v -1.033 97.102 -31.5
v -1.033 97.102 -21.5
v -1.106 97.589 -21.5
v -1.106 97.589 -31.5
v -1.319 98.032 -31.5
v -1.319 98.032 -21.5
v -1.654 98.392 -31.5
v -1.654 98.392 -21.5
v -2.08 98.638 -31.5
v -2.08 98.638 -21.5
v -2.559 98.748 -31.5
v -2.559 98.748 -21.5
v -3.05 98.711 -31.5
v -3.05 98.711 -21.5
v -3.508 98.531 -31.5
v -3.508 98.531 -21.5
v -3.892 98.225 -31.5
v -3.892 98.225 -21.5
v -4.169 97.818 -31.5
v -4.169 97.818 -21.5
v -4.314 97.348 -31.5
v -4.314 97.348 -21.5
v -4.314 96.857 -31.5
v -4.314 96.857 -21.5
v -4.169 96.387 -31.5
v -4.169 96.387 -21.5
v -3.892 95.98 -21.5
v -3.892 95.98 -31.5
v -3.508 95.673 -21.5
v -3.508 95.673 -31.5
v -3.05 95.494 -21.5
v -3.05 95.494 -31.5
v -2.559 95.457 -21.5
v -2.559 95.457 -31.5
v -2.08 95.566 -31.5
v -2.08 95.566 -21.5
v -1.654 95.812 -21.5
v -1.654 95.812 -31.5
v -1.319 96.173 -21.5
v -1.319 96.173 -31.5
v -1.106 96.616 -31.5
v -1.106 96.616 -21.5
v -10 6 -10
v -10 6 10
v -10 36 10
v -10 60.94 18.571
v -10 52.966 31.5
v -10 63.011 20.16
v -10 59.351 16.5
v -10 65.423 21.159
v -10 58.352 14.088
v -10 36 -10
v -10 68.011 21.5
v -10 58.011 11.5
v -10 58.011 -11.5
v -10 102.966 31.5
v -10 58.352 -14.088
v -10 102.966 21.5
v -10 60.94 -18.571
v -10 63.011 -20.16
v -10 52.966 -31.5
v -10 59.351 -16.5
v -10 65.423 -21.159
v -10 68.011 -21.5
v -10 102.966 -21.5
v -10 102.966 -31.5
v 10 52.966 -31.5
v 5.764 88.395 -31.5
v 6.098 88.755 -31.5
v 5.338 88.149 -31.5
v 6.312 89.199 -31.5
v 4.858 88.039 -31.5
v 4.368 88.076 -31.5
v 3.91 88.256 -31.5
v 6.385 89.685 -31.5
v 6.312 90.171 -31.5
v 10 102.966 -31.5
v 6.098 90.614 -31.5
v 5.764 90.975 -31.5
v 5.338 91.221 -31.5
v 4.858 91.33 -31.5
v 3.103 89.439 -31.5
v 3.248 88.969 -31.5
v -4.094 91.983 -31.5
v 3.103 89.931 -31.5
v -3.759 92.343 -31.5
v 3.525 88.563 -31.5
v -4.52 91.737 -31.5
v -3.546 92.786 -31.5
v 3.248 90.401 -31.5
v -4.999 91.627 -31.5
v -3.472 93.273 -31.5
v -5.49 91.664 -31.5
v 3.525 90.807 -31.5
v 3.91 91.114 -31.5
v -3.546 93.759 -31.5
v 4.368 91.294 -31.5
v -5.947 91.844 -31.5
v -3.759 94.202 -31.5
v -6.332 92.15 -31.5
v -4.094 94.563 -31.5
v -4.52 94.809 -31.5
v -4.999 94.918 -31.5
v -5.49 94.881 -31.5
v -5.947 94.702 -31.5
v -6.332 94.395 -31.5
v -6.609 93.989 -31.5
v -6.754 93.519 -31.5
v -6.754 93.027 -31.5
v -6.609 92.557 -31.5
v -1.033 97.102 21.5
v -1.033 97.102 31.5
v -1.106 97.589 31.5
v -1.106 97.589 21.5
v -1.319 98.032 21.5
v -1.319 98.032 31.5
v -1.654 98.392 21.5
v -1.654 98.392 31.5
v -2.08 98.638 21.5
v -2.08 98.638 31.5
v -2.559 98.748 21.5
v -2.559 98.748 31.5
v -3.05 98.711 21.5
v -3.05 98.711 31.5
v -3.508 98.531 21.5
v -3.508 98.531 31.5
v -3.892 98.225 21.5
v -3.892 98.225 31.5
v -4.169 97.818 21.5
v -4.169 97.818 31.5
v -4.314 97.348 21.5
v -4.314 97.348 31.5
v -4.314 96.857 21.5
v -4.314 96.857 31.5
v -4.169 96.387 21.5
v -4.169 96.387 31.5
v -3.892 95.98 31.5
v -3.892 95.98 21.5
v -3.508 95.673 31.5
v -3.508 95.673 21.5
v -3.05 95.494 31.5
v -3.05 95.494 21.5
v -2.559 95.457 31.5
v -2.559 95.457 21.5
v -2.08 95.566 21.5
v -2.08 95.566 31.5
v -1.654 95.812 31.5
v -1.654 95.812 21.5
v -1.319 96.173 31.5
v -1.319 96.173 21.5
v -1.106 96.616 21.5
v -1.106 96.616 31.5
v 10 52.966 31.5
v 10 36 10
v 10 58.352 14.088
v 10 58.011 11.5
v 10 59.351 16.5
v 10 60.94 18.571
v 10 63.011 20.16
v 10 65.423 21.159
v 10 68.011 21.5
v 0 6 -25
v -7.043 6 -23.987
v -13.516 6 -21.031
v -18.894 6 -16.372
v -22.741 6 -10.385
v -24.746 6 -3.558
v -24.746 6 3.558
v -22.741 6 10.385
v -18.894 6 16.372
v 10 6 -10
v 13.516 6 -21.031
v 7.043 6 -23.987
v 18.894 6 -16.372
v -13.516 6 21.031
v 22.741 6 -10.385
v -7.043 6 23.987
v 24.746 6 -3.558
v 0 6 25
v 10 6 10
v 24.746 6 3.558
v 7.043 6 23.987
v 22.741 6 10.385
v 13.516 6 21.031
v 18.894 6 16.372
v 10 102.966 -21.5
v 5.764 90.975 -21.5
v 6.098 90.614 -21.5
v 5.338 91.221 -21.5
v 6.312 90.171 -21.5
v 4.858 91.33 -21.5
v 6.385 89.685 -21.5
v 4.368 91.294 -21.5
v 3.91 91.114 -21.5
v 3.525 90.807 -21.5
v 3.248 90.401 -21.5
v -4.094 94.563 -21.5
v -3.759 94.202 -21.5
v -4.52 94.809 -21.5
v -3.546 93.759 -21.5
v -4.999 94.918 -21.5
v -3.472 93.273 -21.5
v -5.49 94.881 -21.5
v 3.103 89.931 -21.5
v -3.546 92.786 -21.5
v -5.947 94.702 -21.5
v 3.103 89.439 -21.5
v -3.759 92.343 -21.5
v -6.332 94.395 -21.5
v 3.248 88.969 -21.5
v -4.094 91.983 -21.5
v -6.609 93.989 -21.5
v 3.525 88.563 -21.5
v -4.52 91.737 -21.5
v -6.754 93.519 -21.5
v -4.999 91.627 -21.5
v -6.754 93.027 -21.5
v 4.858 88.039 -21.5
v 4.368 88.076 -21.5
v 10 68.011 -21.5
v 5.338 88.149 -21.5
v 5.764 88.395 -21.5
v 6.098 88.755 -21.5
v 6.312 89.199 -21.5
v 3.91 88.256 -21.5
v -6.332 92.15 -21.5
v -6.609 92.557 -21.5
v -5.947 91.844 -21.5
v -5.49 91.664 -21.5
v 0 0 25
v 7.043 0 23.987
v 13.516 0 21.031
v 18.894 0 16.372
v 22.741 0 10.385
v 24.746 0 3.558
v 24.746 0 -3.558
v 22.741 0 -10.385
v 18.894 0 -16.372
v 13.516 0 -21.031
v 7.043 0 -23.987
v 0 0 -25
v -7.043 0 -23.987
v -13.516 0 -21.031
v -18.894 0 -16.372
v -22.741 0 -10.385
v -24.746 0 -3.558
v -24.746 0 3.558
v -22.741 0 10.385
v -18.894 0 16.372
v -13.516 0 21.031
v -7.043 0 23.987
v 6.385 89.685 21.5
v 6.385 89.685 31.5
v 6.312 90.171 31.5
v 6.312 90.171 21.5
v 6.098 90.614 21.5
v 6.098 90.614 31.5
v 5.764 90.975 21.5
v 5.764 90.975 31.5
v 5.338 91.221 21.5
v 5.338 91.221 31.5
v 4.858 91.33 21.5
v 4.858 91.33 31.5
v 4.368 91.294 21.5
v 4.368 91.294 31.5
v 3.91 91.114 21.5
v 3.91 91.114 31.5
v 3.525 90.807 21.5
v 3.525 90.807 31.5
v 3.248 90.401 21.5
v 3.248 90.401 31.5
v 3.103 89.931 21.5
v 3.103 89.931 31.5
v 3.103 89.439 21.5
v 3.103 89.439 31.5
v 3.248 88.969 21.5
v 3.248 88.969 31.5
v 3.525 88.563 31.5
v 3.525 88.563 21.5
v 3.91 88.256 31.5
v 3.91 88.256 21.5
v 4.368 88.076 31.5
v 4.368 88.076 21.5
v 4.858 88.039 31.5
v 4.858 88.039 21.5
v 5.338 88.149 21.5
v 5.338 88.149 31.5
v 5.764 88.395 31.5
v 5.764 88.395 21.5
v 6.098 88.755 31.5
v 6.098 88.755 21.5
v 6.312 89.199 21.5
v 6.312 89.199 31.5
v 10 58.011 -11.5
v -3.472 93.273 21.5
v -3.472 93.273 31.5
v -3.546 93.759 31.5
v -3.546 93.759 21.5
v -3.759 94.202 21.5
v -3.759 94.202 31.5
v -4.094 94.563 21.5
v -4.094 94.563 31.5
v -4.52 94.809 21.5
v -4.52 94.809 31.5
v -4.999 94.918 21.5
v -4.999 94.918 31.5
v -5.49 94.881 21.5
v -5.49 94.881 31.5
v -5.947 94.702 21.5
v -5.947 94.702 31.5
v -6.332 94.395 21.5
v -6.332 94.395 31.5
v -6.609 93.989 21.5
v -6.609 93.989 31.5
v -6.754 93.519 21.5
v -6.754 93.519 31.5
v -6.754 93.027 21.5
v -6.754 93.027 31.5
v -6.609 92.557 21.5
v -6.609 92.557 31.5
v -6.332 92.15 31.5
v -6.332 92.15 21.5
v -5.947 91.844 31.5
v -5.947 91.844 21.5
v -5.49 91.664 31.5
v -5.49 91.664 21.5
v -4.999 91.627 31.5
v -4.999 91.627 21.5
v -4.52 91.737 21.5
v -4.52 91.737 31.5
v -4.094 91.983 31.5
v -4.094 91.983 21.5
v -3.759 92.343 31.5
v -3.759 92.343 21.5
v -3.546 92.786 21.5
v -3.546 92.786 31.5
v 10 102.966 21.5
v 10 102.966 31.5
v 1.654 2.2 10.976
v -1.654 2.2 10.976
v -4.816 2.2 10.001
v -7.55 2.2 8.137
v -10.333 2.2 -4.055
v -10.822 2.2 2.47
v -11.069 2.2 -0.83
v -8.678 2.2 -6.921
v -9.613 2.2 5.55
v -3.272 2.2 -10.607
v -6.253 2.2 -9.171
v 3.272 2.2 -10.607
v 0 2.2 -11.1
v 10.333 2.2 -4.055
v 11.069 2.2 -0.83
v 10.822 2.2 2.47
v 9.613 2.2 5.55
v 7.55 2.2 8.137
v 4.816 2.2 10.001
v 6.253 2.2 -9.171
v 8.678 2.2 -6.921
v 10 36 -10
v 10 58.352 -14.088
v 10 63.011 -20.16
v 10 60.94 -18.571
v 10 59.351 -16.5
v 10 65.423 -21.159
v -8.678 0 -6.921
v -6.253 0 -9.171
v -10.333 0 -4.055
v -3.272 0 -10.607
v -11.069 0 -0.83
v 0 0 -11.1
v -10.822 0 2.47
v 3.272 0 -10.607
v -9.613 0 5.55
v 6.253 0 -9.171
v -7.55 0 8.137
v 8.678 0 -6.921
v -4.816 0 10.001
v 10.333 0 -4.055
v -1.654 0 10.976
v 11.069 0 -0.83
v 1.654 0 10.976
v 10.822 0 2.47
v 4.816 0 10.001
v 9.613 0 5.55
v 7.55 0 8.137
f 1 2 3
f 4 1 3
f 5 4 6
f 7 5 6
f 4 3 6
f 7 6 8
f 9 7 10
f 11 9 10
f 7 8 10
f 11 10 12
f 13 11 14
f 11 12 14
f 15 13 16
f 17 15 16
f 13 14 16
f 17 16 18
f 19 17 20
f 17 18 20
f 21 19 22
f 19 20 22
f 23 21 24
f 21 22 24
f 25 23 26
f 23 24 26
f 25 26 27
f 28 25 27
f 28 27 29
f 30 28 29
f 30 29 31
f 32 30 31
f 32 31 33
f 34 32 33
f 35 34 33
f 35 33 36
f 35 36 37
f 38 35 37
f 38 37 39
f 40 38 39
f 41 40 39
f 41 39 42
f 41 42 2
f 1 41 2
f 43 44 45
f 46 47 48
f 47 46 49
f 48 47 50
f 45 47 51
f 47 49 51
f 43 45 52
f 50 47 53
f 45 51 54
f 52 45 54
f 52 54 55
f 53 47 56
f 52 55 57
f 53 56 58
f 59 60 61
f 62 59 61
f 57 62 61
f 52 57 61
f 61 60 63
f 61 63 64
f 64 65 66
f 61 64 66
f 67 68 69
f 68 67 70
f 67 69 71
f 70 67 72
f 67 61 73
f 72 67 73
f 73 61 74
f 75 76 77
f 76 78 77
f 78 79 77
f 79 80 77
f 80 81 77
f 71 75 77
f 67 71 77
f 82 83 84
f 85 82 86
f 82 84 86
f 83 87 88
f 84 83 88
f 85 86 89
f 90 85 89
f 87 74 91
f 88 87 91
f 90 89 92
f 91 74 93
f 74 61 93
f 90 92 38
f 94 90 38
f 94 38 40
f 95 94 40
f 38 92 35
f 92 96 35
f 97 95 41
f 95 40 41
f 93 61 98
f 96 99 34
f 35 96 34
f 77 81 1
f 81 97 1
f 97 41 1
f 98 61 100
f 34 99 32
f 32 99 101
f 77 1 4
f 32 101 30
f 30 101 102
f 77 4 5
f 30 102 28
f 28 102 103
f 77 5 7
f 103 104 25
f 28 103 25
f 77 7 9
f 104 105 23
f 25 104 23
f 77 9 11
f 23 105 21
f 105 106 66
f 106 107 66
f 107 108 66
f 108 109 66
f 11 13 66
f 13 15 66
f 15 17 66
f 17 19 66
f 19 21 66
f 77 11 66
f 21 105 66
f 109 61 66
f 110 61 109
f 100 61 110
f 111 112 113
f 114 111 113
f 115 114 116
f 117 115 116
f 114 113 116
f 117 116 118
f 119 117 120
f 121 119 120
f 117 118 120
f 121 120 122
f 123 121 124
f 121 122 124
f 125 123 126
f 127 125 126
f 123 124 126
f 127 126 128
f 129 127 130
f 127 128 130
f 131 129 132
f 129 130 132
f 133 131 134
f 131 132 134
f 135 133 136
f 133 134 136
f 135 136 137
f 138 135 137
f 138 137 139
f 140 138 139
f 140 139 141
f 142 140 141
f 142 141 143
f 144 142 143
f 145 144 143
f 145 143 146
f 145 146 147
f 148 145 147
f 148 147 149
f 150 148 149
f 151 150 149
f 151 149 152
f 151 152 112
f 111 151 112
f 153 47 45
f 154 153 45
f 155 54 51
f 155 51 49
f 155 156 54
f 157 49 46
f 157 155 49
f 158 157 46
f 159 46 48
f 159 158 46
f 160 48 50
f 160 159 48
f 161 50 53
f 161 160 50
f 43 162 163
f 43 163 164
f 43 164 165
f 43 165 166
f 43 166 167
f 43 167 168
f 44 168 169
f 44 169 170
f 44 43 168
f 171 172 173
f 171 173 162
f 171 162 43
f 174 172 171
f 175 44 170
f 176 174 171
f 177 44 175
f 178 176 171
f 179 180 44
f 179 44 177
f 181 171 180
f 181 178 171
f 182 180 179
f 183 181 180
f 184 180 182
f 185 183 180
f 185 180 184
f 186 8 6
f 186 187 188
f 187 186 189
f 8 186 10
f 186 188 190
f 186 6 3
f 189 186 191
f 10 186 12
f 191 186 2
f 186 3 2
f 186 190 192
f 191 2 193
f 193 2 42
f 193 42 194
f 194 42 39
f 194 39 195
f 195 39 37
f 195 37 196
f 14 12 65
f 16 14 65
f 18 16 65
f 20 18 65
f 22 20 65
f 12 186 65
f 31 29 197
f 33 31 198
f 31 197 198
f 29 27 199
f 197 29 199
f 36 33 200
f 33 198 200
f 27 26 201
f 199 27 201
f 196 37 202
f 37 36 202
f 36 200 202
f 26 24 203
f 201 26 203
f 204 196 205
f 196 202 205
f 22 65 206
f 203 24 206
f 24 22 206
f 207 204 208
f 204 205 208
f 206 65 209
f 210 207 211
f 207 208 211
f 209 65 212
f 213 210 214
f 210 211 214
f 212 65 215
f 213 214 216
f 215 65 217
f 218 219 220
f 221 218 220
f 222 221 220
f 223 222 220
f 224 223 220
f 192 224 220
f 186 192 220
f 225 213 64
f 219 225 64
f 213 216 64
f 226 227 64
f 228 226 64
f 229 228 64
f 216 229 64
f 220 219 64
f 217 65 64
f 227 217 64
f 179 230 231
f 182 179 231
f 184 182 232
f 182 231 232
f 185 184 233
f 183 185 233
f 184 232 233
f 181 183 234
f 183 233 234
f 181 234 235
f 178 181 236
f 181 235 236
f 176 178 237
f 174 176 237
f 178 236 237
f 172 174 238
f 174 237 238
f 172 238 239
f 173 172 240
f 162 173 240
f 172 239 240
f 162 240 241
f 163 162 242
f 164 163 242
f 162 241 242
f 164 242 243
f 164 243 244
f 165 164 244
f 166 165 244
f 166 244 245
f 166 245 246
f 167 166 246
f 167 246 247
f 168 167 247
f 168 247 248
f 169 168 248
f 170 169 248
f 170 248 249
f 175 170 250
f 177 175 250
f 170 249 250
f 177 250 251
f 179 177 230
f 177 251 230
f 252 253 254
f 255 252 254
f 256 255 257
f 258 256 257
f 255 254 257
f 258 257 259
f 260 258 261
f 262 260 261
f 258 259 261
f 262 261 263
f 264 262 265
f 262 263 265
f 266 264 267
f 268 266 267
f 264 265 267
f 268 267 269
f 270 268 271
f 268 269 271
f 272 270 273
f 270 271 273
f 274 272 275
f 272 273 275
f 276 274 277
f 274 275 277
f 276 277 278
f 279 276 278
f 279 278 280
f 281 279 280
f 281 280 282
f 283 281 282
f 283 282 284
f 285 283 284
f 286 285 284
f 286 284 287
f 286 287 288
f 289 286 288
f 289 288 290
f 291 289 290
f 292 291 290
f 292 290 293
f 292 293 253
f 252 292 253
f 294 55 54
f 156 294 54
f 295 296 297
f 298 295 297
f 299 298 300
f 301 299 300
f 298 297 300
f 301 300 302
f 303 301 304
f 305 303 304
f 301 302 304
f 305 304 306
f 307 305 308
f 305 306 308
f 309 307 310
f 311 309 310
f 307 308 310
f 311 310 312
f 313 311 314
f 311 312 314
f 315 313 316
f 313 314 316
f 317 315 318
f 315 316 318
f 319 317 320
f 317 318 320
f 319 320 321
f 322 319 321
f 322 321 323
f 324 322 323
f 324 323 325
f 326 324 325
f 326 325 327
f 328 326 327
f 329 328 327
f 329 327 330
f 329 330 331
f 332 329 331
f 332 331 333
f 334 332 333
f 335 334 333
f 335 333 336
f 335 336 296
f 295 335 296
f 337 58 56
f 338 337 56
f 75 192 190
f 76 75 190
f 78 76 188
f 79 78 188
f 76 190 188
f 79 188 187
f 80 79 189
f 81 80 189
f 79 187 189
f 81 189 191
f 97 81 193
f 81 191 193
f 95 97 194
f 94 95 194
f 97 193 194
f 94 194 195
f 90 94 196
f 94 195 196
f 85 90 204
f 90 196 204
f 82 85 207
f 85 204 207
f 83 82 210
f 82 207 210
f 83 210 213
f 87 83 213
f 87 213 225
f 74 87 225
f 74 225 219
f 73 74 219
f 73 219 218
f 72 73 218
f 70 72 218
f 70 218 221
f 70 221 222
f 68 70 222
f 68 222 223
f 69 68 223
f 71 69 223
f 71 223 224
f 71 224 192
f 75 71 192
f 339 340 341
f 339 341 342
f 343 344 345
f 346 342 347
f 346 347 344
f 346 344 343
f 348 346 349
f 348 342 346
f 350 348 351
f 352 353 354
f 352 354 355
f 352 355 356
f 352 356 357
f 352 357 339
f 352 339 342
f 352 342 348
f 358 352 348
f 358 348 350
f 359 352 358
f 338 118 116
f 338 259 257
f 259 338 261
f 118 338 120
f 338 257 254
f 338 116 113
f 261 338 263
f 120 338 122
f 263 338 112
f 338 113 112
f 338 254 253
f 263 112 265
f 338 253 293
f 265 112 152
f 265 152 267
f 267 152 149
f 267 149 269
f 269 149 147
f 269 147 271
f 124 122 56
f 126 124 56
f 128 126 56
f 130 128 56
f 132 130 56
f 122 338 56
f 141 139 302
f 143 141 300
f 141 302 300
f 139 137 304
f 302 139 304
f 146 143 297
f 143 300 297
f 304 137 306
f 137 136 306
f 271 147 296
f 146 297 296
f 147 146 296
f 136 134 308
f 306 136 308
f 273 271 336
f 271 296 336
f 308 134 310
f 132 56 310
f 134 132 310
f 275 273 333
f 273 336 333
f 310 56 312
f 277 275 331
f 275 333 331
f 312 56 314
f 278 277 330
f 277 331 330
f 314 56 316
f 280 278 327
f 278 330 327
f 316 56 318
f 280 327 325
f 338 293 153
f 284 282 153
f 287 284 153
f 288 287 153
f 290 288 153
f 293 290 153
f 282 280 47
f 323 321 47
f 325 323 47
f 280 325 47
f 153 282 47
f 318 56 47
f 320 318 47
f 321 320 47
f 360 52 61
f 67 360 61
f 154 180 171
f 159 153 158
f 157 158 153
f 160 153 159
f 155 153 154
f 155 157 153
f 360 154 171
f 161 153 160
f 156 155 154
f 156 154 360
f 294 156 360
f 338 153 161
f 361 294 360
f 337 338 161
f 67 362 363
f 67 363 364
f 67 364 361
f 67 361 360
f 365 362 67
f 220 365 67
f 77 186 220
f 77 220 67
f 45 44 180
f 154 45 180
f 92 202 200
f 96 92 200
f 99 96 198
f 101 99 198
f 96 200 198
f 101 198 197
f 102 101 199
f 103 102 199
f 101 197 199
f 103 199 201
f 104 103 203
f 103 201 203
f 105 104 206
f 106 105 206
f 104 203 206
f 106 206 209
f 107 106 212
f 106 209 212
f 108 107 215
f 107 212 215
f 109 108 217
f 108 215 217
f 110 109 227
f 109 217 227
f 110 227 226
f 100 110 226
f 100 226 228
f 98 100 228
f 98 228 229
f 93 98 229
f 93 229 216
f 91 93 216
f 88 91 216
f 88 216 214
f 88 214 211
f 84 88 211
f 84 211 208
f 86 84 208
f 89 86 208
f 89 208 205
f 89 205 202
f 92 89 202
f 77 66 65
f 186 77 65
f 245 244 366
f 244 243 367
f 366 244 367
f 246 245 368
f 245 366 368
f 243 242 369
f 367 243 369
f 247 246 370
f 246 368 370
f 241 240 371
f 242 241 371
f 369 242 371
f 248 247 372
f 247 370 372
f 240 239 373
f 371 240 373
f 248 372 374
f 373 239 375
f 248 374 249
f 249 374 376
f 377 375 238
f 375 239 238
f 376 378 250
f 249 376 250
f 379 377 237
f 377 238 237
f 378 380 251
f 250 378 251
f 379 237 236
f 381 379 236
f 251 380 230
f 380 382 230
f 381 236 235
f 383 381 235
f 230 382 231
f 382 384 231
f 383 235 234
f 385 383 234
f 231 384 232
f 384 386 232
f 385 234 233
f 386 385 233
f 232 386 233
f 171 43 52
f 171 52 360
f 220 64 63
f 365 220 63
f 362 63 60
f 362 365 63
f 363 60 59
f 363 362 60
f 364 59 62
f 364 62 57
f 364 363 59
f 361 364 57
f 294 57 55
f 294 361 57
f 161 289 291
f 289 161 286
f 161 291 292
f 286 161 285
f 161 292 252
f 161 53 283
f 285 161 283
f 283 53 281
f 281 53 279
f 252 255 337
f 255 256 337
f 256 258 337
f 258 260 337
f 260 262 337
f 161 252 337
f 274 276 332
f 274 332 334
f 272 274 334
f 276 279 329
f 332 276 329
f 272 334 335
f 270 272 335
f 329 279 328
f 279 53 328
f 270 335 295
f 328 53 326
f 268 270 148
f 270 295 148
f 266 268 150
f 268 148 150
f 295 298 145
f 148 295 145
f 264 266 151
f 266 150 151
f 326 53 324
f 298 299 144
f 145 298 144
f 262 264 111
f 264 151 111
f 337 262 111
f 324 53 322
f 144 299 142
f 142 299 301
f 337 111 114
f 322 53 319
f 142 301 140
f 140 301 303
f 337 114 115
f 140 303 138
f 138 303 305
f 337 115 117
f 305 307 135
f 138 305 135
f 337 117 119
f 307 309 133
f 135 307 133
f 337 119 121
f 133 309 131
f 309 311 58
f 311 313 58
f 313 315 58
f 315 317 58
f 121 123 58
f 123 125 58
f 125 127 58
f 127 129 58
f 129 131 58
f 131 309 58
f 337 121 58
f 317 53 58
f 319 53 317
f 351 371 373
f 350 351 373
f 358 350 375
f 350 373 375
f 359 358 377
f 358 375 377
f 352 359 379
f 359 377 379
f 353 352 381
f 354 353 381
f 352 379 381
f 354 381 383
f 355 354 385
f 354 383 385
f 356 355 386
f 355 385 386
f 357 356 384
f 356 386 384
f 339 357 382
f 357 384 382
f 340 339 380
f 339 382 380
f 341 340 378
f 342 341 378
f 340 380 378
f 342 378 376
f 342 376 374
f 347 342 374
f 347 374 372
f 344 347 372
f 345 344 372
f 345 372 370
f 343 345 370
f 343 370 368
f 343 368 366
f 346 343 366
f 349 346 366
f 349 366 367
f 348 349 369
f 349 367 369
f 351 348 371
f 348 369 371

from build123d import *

# Parameters (mm, degrees)
SKETCH1_R           = 25
BOSS_EXTRUDE1_DEPTH = 6
SKETCH2_W           = 20
SKETCH2_H           = 20
BOSS_EXTRUDE2_DEPTH = 30
BOSS_EXTRUDE3_DEPTH = 20
FILLET1_R           = 10
FILLET2_R           = 10
SKETCH4_R           = 11.1
CUT_EXTRUDE1_DEPTH  = 2.2
SKETCH5_R           = 1.65
CUT_EXTRUDE2_DEPTH  = 80


with BuildPart() as part:
    # Sketch1 → Boss-Extrude1 (new body)
    with BuildSketch(Plane(origin=(0, 0, 0), x_dir=(1, 0, 0), z_dir=(0, 1, 0))):
        with Locations(Location((0, 0, 0), (0, 0, 270))):
            Circle(SKETCH1_R)
    extrude(amount=BOSS_EXTRUDE1_DEPTH)

    # Sketch2 → Boss-Extrude2 (add)
    with BuildSketch(Plane(origin=(0, 6, 0), x_dir=(1, 0, 0), z_dir=(0, 1, 0))):
        Rectangle(SKETCH2_W, SKETCH2_H)
    extrude(amount=BOSS_EXTRUDE2_DEPTH)

    # Sketch3 → Boss-Extrude3 (add)
    with BuildSketch(Plane.ZY.offset(10)):
        Polygon((-10, 36), (-31.5, 52.965778424), (-31.5, 102.965778424), (-21.5, 102.965778424), (-21.5, 58.01124712), (21.5, 58.01124712), (21.5, 102.965778424), (31.5, 102.965778424), (31.5, 52.965778424), (10, 36), align=None)
    extrude(amount=-BOSS_EXTRUDE3_DEPTH)

    # Fillet1
    fillet1_edges = [part.edges().sort_by_distance(p)[0] for p in [
        (0, 58.01124712, -21.5),
    ]]
    fillet(fillet1_edges, radius=FILLET1_R)

    # Fillet2
    fillet2_edges = [part.edges().sort_by_distance(p)[0] for p in [
        (0, 58.01124712, 21.5),
    ]]
    fillet(fillet2_edges, radius=FILLET2_R)

    # Sketch4 → Cut-Extrude1 (cut)
    with BuildSketch(Plane.XZ):
        with Locations(Location((0, 0, 0), (0, 0, 270))):
            Circle(SKETCH4_R)
    extrude(amount=-CUT_EXTRUDE1_DEPTH, mode=Mode.SUBTRACT)

    # Sketch5 → Cut-Extrude2 (cut)
    with BuildSketch(Plane.XY.offset(31.5)):
        with Locations((4.734939198, 89.684875187)):
            Circle(SKETCH5_R)
        with Locations((-2.682610937, 97.102425322)):
            Circle(SKETCH5_R)
        with Locations((-5.122436395, 93.272666491)):
            Circle(SKETCH5_R)
    extrude(amount=-CUT_EXTRUDE2_DEPTH, mode=Mode.SUBTRACT)


solid = part.part
